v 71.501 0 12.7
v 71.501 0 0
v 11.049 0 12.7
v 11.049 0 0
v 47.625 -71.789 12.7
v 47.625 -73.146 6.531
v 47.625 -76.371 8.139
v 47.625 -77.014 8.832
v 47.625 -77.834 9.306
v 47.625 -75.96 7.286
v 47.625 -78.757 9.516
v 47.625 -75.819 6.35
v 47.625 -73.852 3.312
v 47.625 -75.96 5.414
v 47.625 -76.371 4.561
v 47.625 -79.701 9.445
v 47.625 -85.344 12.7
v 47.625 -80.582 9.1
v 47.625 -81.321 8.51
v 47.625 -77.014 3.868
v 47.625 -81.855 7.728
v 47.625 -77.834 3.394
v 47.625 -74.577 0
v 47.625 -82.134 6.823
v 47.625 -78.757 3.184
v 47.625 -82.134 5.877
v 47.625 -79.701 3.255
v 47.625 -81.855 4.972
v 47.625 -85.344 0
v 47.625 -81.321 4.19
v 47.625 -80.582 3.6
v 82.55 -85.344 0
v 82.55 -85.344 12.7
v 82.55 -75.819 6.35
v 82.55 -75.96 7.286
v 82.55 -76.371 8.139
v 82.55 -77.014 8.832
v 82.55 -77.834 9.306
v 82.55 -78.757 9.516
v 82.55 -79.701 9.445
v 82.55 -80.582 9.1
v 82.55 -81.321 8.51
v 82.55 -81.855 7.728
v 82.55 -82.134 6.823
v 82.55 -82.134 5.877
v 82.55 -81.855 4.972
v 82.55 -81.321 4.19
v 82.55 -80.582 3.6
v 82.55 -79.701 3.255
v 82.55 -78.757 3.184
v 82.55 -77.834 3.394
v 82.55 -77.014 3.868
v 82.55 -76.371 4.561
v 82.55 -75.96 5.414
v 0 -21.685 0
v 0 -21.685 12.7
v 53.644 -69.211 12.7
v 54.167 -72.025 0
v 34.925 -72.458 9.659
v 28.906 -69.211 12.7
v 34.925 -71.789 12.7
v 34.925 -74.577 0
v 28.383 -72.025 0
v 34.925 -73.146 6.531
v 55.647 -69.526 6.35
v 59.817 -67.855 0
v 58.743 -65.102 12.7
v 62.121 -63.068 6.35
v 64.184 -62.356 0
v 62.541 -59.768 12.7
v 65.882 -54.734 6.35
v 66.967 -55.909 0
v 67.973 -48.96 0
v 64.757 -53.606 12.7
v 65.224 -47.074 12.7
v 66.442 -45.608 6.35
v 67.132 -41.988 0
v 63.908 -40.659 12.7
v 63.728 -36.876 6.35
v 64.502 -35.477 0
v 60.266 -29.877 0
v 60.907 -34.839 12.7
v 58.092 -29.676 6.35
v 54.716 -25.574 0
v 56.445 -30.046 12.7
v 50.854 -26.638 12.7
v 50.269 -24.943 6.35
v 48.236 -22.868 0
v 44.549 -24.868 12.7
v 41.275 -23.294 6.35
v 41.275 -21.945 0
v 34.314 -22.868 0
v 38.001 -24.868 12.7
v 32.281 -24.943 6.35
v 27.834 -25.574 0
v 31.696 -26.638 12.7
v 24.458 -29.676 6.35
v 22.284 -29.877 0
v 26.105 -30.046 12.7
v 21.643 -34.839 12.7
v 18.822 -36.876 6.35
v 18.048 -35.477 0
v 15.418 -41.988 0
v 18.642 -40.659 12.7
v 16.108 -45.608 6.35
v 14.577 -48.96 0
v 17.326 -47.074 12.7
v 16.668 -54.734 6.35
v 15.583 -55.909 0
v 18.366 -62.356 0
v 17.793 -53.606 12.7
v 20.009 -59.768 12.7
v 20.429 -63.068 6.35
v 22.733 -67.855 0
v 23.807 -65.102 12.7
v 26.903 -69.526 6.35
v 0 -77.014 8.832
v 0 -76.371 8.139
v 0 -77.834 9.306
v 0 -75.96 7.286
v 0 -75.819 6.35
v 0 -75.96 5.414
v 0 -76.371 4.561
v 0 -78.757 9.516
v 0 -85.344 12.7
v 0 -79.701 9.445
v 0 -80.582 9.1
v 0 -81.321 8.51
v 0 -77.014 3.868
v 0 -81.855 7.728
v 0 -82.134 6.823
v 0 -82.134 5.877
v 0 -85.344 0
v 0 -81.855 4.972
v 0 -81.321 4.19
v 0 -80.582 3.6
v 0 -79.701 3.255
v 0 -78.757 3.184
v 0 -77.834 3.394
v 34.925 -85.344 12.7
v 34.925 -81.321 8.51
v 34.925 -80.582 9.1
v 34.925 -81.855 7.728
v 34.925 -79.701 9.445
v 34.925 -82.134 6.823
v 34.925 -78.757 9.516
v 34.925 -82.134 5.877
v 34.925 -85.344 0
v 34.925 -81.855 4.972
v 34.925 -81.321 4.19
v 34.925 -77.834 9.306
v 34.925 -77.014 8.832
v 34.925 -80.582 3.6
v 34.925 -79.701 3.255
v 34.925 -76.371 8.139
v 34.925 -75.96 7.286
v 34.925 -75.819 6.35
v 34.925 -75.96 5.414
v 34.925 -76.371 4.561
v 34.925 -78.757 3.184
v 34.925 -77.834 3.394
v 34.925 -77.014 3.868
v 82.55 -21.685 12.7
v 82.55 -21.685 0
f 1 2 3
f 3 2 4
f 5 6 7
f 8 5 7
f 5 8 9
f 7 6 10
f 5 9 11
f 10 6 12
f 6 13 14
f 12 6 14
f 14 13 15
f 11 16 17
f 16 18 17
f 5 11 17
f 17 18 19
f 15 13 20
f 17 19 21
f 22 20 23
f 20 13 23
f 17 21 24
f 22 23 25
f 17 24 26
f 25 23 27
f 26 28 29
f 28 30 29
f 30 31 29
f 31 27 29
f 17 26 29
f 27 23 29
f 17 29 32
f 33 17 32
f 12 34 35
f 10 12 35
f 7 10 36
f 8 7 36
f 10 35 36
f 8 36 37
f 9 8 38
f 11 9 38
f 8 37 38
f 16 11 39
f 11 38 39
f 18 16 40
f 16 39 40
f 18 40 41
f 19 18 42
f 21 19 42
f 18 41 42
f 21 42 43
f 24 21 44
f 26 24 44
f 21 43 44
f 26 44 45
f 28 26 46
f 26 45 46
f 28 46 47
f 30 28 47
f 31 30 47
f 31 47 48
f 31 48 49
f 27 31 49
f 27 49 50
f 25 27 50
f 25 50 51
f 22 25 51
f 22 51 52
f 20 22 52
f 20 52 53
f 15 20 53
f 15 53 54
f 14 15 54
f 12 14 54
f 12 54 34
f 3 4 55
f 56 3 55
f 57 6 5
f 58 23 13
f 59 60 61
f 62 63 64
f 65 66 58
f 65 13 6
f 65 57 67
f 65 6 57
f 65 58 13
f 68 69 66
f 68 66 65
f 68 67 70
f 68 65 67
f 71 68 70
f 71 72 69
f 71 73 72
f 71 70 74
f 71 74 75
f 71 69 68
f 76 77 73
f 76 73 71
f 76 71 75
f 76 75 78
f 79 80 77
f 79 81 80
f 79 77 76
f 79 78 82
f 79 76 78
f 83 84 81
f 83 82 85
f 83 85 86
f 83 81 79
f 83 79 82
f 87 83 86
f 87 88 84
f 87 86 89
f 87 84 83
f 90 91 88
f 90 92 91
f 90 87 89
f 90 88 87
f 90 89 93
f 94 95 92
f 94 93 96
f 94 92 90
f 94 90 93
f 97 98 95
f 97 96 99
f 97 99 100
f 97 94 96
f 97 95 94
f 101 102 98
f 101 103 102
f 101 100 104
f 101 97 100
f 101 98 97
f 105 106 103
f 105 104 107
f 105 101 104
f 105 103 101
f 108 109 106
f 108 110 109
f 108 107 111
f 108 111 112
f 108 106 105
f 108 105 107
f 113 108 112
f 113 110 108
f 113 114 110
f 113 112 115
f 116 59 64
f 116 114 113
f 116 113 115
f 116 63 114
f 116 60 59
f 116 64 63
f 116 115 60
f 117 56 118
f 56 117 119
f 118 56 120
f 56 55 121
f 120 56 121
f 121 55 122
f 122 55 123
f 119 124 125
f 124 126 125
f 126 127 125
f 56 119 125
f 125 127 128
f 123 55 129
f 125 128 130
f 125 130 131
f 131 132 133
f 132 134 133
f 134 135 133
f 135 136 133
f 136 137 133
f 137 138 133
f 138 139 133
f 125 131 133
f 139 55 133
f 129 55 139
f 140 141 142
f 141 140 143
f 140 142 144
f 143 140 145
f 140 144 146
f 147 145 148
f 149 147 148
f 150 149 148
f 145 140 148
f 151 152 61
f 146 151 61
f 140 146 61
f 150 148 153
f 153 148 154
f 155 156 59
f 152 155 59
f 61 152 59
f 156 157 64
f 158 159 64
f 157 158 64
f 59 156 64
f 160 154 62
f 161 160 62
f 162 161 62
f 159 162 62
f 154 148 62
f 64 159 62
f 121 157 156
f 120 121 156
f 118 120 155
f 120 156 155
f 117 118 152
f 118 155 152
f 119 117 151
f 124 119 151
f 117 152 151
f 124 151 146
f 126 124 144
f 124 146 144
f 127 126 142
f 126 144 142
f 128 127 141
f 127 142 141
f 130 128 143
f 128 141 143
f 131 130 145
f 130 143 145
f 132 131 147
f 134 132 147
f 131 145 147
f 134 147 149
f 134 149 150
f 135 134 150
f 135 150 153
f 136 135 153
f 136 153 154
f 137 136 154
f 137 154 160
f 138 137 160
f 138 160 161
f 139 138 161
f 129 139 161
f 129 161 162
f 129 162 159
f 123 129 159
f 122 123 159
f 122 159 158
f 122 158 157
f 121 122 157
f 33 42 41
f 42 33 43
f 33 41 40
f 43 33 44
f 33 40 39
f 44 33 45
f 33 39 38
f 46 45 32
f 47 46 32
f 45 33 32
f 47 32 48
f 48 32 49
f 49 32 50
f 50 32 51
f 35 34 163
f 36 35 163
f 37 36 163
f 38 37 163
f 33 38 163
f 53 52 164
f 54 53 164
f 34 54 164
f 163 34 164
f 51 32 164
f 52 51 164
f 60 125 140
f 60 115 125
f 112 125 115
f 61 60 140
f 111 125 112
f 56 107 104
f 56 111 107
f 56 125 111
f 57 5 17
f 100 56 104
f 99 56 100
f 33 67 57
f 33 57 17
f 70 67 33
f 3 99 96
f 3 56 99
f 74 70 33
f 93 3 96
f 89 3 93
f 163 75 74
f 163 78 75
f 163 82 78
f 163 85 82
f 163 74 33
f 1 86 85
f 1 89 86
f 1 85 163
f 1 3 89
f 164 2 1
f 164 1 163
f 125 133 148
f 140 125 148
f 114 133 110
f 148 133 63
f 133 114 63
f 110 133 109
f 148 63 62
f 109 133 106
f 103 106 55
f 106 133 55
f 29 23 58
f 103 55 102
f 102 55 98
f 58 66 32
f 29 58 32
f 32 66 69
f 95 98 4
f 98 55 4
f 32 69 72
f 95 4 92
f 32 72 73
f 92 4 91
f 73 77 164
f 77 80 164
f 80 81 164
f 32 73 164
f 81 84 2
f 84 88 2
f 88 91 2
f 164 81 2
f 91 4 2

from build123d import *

# Parameters (mm, degrees)
BOSS_EXTRU_1_DEPTH      = 12.7
ESQUISSE2_R             = 3.175
ENL_V_MAT_EXTRU_1_DEPTH = 120.412691269
ENL_V_MAT_EXTRU_2_DEPTH = 120.412691269


with BuildPart() as part:
    # Esquisse1 → Boss.-Extru.1 (new body)
    with BuildSketch(Plane.XY):
        with BuildLine():
            Line((34.925, -85.344), (34.925, -71.788707818))
            ThreePointArc((34.925, -71.788707818), (41.275, -24.644), (47.625, -71.788707818))
            Line((47.625, -71.788707818), (47.625, -85.344))
            Line((47.625, -85.344), (82.55, -85.344))
            Line((82.55, -85.344), (82.55, 0))
            Line((82.55, 0), (0, 0))
            Line((0, 0), (0, -85.344))
            Line((0, -85.344), (34.925, -85.344))
        make_face()
    extrude(amount=BOSS_EXTRU_1_DEPTH)

    # Esquisse2 → Enlèv. mat.-Extru.1 (cut, through all)
    with BuildSketch(Plane(origin=(82.55, 0, 0), x_dir=(0, 0, -1), z_dir=(1, 0, 0))):
        with Locations(Location((-6.35, -78.994, 0), (0, 0, 90))):
            Circle(ESQUISSE2_R)
    extrude(amount=-ENL_V_MAT_EXTRU_1_DEPTH, mode=Mode.SUBTRACT)

    # Esquisse4 → Enlèvement de matière-Révolution1 (revolve, cut)
    with BuildSketch(Plane.XZ.offset(48.644)):
        Polygon((17.275, 12.7), (14.533802376, -0.19632088), (34.925, -0.19632088), (34.925, 12.7), align=None)
    revolve(axis=Axis((41.275, -48.644, 0), (0, 0, 1)), mode=Mode.SUBTRACT)

    # Esquisse5 → Enlèv. mat.-Extru.2 (cut, through all)
    with BuildSketch(Plane(origin=(0, 0, 0), x_dir=(-1, 0, 0), z_dir=(0, 0, -1))):
        Polygon((-71.501, 0), (-82.55, -21.684883475), (-82.55, 0), align=None)
        Polygon((-11.049, 0), (0, -21.684883475), (0, 0), align=None)
    extrude(amount=-ENL_V_MAT_EXTRU_2_DEPTH, mode=Mode.SUBTRACT)


solid = part.part
